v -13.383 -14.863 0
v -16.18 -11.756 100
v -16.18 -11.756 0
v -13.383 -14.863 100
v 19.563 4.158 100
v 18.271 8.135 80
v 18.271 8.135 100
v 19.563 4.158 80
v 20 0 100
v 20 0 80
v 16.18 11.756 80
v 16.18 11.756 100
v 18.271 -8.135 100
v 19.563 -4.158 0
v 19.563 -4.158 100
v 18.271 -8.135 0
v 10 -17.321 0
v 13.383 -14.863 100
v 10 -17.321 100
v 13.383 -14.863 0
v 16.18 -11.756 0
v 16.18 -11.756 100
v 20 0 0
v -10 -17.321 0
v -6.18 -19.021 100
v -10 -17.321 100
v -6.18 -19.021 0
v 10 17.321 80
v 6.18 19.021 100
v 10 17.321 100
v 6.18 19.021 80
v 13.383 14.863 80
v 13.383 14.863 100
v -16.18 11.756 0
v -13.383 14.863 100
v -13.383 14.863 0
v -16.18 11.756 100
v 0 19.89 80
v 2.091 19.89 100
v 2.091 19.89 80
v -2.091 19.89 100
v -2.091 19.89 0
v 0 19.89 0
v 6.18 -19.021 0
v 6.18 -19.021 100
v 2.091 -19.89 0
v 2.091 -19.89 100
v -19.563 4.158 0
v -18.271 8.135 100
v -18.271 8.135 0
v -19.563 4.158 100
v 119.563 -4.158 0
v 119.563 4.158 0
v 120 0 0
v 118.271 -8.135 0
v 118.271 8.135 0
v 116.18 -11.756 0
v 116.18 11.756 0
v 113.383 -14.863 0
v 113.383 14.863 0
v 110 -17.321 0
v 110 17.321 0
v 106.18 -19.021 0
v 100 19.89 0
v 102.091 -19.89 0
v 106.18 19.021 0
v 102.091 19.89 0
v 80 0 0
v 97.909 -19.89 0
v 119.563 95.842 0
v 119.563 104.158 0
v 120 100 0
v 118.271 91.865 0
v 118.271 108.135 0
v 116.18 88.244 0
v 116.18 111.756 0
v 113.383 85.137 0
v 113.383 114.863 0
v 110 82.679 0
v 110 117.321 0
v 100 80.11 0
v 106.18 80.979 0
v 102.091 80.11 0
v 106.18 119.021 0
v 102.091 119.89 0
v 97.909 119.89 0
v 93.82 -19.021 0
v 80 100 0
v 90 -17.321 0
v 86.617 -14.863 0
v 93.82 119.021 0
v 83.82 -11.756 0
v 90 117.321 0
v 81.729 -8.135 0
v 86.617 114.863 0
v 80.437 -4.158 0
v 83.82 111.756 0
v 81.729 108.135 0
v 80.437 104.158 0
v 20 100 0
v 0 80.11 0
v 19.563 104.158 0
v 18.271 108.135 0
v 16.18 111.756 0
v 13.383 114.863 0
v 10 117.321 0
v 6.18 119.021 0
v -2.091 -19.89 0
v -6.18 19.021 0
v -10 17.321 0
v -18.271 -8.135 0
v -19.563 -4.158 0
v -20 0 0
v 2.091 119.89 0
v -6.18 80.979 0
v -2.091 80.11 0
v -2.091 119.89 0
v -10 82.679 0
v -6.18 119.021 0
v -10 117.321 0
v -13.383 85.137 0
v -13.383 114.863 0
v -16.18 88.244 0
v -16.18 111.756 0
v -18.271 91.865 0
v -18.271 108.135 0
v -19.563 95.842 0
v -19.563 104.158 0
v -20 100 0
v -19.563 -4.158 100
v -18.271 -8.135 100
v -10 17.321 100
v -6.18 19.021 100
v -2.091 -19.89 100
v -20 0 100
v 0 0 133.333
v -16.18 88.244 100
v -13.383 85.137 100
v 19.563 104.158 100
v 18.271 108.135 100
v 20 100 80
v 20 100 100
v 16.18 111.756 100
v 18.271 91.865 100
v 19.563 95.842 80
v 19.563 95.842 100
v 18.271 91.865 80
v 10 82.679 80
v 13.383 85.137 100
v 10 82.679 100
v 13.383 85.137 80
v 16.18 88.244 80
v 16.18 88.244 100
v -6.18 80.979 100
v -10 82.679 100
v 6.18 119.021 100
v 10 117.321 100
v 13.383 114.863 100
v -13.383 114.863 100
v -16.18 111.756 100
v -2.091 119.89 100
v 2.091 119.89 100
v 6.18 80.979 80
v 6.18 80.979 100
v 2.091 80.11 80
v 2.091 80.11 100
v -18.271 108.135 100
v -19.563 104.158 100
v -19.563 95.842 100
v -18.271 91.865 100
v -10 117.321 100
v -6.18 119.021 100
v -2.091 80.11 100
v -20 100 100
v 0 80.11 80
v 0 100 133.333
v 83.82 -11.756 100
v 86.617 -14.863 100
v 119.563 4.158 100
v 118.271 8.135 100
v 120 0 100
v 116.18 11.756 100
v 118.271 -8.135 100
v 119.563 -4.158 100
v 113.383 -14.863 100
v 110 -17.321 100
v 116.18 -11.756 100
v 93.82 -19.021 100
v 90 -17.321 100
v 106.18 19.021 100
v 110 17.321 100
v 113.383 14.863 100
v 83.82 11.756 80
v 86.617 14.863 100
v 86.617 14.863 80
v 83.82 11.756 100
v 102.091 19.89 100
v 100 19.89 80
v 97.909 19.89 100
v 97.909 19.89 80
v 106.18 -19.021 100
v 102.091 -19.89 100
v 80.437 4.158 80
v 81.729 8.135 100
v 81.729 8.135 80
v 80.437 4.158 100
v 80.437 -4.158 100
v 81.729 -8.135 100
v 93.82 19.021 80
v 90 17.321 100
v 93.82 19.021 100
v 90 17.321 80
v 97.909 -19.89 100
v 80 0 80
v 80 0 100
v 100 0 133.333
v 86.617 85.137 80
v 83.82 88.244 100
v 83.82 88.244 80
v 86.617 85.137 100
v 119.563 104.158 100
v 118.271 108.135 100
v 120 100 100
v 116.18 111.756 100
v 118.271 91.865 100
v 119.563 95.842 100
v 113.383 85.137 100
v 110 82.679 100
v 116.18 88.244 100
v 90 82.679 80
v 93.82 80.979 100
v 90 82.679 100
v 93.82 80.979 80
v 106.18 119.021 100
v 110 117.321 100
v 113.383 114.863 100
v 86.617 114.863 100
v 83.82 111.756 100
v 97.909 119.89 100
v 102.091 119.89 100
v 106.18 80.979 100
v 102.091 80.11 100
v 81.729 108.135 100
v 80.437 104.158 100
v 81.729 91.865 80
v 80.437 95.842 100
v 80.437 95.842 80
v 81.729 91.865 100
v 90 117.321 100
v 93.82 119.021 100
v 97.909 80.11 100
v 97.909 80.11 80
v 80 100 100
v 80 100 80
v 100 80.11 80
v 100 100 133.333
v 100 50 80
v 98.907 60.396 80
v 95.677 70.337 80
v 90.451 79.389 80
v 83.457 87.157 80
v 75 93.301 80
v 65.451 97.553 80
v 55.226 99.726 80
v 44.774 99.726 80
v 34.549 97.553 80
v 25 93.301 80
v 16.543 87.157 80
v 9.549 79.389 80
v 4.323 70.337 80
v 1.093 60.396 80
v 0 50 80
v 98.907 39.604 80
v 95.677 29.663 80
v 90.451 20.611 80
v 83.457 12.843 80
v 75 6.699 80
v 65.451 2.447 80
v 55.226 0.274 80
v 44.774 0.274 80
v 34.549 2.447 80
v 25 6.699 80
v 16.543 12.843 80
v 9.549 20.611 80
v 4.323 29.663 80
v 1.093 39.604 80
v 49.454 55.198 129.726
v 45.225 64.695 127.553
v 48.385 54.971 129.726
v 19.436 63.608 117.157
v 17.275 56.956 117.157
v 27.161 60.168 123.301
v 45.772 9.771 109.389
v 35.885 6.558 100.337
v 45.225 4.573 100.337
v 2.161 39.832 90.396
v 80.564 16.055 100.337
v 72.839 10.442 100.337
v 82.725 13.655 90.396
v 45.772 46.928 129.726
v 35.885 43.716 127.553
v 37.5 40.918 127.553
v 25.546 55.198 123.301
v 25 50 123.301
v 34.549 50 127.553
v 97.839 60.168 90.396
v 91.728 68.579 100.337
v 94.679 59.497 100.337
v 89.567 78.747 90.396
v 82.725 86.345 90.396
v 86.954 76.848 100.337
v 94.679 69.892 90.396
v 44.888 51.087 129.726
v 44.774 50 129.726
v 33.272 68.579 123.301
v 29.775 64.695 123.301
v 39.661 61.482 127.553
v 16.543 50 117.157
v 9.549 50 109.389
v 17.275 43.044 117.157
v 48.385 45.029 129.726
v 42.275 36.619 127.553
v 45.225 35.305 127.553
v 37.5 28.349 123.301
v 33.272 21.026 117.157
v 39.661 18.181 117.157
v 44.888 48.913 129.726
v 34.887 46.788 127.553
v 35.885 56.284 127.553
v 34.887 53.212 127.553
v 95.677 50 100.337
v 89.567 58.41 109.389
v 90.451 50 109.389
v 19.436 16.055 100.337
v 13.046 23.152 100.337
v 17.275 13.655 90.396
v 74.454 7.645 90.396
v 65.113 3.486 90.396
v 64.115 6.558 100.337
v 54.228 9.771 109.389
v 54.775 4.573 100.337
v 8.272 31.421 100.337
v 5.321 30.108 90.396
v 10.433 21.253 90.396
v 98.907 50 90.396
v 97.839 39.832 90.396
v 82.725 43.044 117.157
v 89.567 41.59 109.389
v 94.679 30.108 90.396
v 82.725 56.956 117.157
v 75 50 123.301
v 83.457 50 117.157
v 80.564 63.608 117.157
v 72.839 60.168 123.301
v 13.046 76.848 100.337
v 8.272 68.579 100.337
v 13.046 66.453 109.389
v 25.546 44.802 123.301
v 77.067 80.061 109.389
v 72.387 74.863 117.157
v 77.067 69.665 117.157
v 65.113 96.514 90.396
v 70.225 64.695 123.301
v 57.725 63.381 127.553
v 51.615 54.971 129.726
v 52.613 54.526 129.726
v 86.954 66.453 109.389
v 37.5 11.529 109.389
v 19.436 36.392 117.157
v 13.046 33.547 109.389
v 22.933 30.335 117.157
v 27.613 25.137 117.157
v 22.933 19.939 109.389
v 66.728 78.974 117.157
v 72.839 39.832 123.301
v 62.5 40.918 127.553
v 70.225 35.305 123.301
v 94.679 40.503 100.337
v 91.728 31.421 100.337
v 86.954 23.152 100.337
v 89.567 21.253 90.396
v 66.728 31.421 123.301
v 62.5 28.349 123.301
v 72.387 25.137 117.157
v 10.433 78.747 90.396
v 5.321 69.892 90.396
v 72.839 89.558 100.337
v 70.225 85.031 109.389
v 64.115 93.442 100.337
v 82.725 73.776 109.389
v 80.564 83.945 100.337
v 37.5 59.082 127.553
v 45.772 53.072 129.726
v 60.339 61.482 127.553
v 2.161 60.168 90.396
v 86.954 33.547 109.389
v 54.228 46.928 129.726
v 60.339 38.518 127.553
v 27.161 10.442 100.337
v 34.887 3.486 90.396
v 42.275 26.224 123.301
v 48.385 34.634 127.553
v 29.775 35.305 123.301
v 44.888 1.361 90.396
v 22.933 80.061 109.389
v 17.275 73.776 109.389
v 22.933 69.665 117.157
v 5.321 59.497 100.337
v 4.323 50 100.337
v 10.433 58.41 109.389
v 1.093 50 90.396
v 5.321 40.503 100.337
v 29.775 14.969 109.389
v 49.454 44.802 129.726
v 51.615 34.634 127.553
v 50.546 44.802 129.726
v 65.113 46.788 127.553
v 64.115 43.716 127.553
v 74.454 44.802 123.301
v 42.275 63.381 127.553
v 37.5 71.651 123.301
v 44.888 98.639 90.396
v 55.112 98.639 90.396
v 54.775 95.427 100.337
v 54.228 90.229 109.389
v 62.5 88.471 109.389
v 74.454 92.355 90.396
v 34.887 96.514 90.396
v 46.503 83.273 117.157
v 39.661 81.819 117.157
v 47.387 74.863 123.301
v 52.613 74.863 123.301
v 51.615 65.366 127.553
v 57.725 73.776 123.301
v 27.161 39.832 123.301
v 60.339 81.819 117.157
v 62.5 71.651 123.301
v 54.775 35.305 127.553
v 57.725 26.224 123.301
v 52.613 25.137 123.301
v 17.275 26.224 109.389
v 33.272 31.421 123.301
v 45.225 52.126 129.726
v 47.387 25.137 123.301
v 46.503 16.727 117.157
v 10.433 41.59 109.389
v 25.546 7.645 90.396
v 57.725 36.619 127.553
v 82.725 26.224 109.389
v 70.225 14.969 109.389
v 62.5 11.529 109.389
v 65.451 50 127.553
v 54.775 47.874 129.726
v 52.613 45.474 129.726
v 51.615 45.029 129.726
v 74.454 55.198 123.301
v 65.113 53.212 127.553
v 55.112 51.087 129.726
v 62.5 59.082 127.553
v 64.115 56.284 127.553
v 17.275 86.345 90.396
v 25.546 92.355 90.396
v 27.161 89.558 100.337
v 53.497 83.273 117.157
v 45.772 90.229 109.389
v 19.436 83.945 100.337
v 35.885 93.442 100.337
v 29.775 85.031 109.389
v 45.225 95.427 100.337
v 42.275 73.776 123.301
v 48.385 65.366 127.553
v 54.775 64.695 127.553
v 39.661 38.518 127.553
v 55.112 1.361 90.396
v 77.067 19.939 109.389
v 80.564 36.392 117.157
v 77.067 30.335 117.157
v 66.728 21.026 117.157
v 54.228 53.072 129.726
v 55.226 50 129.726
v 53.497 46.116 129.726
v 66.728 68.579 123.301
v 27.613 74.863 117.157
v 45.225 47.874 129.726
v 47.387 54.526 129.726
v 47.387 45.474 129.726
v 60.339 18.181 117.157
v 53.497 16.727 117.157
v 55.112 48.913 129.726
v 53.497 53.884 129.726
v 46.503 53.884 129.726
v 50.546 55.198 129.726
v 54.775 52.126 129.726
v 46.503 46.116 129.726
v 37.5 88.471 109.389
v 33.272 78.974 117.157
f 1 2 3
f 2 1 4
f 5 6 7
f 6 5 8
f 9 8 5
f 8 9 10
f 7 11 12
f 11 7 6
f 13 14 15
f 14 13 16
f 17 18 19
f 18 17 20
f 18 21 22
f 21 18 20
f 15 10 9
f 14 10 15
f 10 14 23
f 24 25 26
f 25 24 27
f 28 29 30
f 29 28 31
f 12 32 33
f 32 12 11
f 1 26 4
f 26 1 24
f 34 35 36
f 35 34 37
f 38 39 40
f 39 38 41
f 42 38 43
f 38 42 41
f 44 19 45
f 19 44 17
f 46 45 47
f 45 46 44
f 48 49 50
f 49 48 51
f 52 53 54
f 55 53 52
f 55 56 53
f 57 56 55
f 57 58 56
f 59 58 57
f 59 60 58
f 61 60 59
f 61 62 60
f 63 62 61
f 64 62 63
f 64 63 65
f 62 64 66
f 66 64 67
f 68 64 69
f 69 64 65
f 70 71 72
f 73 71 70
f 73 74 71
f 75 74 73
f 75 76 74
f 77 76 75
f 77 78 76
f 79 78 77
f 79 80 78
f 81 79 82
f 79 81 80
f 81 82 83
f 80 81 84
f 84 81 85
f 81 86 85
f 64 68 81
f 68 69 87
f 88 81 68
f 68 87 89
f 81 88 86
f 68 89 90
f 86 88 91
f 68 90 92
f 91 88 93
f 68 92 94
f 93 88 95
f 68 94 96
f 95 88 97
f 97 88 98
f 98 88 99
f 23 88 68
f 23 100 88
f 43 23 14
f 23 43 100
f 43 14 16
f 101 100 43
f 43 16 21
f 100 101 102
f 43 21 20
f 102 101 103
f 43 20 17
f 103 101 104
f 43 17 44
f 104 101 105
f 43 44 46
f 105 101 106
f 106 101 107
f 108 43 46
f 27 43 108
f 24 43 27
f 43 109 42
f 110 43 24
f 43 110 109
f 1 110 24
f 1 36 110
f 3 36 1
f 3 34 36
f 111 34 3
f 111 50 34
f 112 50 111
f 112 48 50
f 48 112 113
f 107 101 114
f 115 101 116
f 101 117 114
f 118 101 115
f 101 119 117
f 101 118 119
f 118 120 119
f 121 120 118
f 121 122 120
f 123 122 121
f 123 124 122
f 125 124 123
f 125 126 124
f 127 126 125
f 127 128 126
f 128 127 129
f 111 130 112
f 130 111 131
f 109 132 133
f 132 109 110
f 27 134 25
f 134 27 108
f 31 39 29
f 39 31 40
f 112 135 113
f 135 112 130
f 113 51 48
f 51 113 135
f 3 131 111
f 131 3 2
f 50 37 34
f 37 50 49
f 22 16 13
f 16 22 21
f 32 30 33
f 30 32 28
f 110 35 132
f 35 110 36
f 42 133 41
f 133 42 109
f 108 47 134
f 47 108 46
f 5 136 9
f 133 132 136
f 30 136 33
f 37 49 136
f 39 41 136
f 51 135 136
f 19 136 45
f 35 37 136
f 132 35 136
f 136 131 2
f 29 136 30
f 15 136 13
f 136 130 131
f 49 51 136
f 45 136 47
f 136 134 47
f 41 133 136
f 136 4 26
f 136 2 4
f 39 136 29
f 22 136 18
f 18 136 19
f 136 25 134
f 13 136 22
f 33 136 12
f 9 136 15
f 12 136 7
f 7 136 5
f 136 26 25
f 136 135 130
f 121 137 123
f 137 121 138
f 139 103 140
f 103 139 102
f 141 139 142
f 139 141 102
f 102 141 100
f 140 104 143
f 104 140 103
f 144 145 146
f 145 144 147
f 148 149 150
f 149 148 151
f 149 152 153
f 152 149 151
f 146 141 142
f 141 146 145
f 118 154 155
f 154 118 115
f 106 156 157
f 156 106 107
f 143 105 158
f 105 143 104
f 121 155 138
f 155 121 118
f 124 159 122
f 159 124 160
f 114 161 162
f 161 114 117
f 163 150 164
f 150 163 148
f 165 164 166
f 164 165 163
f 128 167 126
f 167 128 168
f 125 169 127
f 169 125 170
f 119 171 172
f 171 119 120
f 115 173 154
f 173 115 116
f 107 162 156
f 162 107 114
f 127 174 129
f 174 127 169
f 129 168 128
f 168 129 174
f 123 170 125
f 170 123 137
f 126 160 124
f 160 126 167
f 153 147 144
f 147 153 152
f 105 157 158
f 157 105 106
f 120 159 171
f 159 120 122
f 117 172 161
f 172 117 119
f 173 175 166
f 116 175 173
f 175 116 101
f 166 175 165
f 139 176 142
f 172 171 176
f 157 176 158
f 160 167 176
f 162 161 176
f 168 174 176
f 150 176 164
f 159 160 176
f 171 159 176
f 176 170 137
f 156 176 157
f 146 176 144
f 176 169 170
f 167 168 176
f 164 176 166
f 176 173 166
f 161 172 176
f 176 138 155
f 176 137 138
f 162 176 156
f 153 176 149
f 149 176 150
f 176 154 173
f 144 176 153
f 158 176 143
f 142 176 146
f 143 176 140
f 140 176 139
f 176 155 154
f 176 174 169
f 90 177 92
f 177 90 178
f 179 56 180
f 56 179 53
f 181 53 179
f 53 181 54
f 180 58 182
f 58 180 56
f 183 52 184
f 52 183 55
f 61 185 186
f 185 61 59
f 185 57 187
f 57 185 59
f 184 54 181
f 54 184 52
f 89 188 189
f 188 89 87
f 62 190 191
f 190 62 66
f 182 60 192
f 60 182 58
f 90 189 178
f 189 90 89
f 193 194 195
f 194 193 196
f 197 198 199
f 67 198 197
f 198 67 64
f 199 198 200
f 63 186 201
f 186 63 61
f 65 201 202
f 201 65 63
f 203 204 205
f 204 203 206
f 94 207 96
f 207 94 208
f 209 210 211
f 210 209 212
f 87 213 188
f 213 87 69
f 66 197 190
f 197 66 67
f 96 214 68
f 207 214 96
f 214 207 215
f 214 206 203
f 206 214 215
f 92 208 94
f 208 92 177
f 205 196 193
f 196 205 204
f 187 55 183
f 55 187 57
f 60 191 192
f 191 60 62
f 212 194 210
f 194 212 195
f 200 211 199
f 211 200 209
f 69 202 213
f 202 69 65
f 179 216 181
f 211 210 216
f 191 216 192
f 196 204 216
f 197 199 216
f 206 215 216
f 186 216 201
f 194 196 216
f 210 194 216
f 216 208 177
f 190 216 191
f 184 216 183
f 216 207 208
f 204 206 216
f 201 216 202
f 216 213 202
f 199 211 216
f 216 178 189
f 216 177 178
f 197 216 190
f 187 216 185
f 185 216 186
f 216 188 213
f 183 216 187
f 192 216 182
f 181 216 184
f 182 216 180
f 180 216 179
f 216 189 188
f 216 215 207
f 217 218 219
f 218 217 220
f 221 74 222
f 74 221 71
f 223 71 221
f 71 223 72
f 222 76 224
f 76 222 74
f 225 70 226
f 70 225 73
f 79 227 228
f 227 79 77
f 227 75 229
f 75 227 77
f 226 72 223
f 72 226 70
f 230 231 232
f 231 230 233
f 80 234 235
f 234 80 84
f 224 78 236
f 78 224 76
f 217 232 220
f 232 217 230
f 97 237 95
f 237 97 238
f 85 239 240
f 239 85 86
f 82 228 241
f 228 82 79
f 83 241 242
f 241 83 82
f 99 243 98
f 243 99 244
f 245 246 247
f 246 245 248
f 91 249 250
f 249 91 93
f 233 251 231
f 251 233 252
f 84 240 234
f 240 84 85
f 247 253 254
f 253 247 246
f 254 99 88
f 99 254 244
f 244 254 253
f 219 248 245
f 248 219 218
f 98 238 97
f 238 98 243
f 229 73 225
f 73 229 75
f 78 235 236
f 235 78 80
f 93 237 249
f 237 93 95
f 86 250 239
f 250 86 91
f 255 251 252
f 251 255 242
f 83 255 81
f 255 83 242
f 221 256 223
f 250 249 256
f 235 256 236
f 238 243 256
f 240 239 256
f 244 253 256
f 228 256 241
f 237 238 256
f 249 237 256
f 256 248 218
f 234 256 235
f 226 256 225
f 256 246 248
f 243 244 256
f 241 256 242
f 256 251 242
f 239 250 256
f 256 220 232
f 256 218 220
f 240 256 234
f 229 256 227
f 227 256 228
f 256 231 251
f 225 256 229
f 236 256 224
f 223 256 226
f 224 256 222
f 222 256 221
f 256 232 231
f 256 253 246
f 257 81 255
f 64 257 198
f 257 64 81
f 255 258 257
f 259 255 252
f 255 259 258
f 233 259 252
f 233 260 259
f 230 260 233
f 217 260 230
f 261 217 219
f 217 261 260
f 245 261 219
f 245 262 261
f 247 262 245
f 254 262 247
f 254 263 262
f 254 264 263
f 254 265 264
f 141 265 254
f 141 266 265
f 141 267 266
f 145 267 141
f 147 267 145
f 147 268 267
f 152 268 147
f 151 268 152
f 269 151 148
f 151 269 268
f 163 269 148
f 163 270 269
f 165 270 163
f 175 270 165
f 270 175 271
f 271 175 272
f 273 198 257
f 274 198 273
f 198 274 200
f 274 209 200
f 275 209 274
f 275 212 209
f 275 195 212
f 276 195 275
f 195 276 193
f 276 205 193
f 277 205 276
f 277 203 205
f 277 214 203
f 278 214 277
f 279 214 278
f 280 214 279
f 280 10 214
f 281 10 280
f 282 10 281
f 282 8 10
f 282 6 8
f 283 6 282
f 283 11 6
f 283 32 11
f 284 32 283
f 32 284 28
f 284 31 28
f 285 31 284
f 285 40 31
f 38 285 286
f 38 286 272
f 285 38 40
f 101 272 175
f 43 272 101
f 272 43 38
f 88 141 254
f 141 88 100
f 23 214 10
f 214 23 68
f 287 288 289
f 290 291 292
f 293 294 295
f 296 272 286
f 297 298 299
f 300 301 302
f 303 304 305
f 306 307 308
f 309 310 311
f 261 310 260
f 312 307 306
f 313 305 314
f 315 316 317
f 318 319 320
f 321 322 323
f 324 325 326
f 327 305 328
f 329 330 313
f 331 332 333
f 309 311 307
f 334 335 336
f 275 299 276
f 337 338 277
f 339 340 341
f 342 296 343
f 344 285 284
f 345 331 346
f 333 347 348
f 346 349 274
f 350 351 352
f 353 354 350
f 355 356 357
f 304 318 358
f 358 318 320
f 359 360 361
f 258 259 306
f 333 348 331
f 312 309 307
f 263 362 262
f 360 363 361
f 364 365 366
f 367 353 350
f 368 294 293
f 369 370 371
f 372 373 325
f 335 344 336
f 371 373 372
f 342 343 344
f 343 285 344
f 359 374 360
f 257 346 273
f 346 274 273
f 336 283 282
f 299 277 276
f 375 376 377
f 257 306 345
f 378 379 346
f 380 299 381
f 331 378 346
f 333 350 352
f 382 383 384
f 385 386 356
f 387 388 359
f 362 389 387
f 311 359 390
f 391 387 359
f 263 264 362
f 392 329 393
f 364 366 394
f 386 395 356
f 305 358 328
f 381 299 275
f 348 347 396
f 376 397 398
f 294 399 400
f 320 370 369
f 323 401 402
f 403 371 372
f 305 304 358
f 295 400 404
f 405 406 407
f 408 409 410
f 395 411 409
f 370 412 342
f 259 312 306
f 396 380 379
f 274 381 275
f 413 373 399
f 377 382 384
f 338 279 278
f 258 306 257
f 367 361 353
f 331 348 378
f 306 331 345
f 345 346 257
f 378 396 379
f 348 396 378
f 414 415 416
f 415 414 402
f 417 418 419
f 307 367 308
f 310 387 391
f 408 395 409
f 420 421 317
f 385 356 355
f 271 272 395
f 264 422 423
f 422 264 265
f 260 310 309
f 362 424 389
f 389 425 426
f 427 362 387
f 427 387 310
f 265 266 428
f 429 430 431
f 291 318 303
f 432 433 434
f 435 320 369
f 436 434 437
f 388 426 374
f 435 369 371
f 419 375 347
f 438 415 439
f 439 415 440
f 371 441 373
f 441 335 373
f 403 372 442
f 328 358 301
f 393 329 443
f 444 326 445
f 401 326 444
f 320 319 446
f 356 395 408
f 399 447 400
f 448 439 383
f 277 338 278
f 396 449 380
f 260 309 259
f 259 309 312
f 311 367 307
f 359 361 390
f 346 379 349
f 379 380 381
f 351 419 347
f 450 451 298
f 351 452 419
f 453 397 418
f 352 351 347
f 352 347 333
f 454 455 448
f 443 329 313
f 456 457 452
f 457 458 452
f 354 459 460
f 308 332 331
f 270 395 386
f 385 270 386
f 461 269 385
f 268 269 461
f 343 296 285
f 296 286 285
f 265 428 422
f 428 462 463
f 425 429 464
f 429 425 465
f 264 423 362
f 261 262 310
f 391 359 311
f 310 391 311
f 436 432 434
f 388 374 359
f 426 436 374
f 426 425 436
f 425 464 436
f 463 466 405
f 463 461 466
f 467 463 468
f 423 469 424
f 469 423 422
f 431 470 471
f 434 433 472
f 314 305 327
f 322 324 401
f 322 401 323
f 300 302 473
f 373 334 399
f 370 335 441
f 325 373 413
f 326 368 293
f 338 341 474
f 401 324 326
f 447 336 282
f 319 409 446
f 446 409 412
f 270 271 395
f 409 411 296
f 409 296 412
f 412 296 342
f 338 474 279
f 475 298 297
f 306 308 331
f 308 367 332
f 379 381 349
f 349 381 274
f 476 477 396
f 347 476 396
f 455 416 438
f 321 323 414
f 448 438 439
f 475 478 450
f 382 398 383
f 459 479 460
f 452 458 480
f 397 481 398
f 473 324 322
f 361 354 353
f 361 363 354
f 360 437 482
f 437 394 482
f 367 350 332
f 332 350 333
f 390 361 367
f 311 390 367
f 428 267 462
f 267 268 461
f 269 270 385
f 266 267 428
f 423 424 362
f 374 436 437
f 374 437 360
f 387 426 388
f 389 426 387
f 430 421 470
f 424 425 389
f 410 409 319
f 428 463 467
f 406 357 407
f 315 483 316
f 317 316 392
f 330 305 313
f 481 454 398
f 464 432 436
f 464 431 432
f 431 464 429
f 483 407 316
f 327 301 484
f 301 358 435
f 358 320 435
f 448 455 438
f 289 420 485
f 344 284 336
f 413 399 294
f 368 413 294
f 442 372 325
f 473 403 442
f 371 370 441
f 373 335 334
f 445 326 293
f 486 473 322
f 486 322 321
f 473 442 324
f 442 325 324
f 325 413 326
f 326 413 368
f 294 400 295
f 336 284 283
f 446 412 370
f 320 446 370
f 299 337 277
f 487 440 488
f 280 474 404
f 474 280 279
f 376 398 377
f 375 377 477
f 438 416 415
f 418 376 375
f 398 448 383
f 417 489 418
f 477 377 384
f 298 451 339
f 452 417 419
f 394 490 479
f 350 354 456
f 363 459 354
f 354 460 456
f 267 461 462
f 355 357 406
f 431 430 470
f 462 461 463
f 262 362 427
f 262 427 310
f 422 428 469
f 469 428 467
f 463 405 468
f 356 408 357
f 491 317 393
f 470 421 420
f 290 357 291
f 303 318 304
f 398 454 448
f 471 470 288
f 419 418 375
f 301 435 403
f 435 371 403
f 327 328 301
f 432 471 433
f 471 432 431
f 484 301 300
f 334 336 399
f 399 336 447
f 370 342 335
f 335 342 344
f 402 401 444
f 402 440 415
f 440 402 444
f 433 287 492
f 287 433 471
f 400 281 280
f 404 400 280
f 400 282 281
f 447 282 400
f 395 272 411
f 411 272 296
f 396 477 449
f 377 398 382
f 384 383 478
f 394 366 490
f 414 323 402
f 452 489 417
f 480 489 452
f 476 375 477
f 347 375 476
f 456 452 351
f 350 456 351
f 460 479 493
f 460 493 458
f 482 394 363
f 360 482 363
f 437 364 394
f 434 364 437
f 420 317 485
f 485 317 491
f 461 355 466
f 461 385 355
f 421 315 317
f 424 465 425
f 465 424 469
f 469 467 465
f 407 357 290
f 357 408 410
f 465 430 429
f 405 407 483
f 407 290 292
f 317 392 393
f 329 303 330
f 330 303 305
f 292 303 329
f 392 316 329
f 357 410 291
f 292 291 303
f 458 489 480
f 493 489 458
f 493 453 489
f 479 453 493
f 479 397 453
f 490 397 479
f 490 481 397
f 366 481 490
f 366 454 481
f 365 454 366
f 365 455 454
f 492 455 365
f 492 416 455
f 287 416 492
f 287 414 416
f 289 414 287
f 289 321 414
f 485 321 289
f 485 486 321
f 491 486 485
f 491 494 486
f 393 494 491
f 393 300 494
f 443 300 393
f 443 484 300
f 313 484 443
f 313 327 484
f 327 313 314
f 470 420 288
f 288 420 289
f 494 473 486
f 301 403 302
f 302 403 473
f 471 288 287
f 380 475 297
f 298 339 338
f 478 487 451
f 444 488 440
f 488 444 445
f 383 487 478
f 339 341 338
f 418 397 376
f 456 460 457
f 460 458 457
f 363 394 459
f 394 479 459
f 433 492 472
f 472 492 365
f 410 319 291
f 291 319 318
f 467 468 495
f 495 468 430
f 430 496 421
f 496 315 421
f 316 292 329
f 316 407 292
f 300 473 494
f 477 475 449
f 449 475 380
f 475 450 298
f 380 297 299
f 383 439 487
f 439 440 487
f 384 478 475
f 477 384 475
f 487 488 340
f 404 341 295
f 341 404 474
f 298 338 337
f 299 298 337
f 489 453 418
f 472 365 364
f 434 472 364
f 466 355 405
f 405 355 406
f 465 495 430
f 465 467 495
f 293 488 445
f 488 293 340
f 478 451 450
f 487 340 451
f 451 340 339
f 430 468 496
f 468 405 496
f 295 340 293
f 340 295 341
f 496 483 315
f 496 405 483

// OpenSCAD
// torre con alto y ancho
module torre(alto,diametro){
	cylinder(h = alto, r=diametro/2);
	translate([0,0,alto])cylinder(h = alto/3, r1 = diametro/2, r2 = 0, center = false);
}



module castillo(alto,diametro)
{
	//cuerpo principal
	cube(size=[alto,alto,alto*0.8]);
	
	//Cupula
	translate([alto/2,alto/2,alto*0.8])sphere(r=alto/2);

	//4 torres
	for ( i = [0 : 1] )
	{
		for (j= [0:1])
		{
			translate([i*alto,j*alto,0])torre(alto,diametro);
		}
	}
}

castillo(100,40);
